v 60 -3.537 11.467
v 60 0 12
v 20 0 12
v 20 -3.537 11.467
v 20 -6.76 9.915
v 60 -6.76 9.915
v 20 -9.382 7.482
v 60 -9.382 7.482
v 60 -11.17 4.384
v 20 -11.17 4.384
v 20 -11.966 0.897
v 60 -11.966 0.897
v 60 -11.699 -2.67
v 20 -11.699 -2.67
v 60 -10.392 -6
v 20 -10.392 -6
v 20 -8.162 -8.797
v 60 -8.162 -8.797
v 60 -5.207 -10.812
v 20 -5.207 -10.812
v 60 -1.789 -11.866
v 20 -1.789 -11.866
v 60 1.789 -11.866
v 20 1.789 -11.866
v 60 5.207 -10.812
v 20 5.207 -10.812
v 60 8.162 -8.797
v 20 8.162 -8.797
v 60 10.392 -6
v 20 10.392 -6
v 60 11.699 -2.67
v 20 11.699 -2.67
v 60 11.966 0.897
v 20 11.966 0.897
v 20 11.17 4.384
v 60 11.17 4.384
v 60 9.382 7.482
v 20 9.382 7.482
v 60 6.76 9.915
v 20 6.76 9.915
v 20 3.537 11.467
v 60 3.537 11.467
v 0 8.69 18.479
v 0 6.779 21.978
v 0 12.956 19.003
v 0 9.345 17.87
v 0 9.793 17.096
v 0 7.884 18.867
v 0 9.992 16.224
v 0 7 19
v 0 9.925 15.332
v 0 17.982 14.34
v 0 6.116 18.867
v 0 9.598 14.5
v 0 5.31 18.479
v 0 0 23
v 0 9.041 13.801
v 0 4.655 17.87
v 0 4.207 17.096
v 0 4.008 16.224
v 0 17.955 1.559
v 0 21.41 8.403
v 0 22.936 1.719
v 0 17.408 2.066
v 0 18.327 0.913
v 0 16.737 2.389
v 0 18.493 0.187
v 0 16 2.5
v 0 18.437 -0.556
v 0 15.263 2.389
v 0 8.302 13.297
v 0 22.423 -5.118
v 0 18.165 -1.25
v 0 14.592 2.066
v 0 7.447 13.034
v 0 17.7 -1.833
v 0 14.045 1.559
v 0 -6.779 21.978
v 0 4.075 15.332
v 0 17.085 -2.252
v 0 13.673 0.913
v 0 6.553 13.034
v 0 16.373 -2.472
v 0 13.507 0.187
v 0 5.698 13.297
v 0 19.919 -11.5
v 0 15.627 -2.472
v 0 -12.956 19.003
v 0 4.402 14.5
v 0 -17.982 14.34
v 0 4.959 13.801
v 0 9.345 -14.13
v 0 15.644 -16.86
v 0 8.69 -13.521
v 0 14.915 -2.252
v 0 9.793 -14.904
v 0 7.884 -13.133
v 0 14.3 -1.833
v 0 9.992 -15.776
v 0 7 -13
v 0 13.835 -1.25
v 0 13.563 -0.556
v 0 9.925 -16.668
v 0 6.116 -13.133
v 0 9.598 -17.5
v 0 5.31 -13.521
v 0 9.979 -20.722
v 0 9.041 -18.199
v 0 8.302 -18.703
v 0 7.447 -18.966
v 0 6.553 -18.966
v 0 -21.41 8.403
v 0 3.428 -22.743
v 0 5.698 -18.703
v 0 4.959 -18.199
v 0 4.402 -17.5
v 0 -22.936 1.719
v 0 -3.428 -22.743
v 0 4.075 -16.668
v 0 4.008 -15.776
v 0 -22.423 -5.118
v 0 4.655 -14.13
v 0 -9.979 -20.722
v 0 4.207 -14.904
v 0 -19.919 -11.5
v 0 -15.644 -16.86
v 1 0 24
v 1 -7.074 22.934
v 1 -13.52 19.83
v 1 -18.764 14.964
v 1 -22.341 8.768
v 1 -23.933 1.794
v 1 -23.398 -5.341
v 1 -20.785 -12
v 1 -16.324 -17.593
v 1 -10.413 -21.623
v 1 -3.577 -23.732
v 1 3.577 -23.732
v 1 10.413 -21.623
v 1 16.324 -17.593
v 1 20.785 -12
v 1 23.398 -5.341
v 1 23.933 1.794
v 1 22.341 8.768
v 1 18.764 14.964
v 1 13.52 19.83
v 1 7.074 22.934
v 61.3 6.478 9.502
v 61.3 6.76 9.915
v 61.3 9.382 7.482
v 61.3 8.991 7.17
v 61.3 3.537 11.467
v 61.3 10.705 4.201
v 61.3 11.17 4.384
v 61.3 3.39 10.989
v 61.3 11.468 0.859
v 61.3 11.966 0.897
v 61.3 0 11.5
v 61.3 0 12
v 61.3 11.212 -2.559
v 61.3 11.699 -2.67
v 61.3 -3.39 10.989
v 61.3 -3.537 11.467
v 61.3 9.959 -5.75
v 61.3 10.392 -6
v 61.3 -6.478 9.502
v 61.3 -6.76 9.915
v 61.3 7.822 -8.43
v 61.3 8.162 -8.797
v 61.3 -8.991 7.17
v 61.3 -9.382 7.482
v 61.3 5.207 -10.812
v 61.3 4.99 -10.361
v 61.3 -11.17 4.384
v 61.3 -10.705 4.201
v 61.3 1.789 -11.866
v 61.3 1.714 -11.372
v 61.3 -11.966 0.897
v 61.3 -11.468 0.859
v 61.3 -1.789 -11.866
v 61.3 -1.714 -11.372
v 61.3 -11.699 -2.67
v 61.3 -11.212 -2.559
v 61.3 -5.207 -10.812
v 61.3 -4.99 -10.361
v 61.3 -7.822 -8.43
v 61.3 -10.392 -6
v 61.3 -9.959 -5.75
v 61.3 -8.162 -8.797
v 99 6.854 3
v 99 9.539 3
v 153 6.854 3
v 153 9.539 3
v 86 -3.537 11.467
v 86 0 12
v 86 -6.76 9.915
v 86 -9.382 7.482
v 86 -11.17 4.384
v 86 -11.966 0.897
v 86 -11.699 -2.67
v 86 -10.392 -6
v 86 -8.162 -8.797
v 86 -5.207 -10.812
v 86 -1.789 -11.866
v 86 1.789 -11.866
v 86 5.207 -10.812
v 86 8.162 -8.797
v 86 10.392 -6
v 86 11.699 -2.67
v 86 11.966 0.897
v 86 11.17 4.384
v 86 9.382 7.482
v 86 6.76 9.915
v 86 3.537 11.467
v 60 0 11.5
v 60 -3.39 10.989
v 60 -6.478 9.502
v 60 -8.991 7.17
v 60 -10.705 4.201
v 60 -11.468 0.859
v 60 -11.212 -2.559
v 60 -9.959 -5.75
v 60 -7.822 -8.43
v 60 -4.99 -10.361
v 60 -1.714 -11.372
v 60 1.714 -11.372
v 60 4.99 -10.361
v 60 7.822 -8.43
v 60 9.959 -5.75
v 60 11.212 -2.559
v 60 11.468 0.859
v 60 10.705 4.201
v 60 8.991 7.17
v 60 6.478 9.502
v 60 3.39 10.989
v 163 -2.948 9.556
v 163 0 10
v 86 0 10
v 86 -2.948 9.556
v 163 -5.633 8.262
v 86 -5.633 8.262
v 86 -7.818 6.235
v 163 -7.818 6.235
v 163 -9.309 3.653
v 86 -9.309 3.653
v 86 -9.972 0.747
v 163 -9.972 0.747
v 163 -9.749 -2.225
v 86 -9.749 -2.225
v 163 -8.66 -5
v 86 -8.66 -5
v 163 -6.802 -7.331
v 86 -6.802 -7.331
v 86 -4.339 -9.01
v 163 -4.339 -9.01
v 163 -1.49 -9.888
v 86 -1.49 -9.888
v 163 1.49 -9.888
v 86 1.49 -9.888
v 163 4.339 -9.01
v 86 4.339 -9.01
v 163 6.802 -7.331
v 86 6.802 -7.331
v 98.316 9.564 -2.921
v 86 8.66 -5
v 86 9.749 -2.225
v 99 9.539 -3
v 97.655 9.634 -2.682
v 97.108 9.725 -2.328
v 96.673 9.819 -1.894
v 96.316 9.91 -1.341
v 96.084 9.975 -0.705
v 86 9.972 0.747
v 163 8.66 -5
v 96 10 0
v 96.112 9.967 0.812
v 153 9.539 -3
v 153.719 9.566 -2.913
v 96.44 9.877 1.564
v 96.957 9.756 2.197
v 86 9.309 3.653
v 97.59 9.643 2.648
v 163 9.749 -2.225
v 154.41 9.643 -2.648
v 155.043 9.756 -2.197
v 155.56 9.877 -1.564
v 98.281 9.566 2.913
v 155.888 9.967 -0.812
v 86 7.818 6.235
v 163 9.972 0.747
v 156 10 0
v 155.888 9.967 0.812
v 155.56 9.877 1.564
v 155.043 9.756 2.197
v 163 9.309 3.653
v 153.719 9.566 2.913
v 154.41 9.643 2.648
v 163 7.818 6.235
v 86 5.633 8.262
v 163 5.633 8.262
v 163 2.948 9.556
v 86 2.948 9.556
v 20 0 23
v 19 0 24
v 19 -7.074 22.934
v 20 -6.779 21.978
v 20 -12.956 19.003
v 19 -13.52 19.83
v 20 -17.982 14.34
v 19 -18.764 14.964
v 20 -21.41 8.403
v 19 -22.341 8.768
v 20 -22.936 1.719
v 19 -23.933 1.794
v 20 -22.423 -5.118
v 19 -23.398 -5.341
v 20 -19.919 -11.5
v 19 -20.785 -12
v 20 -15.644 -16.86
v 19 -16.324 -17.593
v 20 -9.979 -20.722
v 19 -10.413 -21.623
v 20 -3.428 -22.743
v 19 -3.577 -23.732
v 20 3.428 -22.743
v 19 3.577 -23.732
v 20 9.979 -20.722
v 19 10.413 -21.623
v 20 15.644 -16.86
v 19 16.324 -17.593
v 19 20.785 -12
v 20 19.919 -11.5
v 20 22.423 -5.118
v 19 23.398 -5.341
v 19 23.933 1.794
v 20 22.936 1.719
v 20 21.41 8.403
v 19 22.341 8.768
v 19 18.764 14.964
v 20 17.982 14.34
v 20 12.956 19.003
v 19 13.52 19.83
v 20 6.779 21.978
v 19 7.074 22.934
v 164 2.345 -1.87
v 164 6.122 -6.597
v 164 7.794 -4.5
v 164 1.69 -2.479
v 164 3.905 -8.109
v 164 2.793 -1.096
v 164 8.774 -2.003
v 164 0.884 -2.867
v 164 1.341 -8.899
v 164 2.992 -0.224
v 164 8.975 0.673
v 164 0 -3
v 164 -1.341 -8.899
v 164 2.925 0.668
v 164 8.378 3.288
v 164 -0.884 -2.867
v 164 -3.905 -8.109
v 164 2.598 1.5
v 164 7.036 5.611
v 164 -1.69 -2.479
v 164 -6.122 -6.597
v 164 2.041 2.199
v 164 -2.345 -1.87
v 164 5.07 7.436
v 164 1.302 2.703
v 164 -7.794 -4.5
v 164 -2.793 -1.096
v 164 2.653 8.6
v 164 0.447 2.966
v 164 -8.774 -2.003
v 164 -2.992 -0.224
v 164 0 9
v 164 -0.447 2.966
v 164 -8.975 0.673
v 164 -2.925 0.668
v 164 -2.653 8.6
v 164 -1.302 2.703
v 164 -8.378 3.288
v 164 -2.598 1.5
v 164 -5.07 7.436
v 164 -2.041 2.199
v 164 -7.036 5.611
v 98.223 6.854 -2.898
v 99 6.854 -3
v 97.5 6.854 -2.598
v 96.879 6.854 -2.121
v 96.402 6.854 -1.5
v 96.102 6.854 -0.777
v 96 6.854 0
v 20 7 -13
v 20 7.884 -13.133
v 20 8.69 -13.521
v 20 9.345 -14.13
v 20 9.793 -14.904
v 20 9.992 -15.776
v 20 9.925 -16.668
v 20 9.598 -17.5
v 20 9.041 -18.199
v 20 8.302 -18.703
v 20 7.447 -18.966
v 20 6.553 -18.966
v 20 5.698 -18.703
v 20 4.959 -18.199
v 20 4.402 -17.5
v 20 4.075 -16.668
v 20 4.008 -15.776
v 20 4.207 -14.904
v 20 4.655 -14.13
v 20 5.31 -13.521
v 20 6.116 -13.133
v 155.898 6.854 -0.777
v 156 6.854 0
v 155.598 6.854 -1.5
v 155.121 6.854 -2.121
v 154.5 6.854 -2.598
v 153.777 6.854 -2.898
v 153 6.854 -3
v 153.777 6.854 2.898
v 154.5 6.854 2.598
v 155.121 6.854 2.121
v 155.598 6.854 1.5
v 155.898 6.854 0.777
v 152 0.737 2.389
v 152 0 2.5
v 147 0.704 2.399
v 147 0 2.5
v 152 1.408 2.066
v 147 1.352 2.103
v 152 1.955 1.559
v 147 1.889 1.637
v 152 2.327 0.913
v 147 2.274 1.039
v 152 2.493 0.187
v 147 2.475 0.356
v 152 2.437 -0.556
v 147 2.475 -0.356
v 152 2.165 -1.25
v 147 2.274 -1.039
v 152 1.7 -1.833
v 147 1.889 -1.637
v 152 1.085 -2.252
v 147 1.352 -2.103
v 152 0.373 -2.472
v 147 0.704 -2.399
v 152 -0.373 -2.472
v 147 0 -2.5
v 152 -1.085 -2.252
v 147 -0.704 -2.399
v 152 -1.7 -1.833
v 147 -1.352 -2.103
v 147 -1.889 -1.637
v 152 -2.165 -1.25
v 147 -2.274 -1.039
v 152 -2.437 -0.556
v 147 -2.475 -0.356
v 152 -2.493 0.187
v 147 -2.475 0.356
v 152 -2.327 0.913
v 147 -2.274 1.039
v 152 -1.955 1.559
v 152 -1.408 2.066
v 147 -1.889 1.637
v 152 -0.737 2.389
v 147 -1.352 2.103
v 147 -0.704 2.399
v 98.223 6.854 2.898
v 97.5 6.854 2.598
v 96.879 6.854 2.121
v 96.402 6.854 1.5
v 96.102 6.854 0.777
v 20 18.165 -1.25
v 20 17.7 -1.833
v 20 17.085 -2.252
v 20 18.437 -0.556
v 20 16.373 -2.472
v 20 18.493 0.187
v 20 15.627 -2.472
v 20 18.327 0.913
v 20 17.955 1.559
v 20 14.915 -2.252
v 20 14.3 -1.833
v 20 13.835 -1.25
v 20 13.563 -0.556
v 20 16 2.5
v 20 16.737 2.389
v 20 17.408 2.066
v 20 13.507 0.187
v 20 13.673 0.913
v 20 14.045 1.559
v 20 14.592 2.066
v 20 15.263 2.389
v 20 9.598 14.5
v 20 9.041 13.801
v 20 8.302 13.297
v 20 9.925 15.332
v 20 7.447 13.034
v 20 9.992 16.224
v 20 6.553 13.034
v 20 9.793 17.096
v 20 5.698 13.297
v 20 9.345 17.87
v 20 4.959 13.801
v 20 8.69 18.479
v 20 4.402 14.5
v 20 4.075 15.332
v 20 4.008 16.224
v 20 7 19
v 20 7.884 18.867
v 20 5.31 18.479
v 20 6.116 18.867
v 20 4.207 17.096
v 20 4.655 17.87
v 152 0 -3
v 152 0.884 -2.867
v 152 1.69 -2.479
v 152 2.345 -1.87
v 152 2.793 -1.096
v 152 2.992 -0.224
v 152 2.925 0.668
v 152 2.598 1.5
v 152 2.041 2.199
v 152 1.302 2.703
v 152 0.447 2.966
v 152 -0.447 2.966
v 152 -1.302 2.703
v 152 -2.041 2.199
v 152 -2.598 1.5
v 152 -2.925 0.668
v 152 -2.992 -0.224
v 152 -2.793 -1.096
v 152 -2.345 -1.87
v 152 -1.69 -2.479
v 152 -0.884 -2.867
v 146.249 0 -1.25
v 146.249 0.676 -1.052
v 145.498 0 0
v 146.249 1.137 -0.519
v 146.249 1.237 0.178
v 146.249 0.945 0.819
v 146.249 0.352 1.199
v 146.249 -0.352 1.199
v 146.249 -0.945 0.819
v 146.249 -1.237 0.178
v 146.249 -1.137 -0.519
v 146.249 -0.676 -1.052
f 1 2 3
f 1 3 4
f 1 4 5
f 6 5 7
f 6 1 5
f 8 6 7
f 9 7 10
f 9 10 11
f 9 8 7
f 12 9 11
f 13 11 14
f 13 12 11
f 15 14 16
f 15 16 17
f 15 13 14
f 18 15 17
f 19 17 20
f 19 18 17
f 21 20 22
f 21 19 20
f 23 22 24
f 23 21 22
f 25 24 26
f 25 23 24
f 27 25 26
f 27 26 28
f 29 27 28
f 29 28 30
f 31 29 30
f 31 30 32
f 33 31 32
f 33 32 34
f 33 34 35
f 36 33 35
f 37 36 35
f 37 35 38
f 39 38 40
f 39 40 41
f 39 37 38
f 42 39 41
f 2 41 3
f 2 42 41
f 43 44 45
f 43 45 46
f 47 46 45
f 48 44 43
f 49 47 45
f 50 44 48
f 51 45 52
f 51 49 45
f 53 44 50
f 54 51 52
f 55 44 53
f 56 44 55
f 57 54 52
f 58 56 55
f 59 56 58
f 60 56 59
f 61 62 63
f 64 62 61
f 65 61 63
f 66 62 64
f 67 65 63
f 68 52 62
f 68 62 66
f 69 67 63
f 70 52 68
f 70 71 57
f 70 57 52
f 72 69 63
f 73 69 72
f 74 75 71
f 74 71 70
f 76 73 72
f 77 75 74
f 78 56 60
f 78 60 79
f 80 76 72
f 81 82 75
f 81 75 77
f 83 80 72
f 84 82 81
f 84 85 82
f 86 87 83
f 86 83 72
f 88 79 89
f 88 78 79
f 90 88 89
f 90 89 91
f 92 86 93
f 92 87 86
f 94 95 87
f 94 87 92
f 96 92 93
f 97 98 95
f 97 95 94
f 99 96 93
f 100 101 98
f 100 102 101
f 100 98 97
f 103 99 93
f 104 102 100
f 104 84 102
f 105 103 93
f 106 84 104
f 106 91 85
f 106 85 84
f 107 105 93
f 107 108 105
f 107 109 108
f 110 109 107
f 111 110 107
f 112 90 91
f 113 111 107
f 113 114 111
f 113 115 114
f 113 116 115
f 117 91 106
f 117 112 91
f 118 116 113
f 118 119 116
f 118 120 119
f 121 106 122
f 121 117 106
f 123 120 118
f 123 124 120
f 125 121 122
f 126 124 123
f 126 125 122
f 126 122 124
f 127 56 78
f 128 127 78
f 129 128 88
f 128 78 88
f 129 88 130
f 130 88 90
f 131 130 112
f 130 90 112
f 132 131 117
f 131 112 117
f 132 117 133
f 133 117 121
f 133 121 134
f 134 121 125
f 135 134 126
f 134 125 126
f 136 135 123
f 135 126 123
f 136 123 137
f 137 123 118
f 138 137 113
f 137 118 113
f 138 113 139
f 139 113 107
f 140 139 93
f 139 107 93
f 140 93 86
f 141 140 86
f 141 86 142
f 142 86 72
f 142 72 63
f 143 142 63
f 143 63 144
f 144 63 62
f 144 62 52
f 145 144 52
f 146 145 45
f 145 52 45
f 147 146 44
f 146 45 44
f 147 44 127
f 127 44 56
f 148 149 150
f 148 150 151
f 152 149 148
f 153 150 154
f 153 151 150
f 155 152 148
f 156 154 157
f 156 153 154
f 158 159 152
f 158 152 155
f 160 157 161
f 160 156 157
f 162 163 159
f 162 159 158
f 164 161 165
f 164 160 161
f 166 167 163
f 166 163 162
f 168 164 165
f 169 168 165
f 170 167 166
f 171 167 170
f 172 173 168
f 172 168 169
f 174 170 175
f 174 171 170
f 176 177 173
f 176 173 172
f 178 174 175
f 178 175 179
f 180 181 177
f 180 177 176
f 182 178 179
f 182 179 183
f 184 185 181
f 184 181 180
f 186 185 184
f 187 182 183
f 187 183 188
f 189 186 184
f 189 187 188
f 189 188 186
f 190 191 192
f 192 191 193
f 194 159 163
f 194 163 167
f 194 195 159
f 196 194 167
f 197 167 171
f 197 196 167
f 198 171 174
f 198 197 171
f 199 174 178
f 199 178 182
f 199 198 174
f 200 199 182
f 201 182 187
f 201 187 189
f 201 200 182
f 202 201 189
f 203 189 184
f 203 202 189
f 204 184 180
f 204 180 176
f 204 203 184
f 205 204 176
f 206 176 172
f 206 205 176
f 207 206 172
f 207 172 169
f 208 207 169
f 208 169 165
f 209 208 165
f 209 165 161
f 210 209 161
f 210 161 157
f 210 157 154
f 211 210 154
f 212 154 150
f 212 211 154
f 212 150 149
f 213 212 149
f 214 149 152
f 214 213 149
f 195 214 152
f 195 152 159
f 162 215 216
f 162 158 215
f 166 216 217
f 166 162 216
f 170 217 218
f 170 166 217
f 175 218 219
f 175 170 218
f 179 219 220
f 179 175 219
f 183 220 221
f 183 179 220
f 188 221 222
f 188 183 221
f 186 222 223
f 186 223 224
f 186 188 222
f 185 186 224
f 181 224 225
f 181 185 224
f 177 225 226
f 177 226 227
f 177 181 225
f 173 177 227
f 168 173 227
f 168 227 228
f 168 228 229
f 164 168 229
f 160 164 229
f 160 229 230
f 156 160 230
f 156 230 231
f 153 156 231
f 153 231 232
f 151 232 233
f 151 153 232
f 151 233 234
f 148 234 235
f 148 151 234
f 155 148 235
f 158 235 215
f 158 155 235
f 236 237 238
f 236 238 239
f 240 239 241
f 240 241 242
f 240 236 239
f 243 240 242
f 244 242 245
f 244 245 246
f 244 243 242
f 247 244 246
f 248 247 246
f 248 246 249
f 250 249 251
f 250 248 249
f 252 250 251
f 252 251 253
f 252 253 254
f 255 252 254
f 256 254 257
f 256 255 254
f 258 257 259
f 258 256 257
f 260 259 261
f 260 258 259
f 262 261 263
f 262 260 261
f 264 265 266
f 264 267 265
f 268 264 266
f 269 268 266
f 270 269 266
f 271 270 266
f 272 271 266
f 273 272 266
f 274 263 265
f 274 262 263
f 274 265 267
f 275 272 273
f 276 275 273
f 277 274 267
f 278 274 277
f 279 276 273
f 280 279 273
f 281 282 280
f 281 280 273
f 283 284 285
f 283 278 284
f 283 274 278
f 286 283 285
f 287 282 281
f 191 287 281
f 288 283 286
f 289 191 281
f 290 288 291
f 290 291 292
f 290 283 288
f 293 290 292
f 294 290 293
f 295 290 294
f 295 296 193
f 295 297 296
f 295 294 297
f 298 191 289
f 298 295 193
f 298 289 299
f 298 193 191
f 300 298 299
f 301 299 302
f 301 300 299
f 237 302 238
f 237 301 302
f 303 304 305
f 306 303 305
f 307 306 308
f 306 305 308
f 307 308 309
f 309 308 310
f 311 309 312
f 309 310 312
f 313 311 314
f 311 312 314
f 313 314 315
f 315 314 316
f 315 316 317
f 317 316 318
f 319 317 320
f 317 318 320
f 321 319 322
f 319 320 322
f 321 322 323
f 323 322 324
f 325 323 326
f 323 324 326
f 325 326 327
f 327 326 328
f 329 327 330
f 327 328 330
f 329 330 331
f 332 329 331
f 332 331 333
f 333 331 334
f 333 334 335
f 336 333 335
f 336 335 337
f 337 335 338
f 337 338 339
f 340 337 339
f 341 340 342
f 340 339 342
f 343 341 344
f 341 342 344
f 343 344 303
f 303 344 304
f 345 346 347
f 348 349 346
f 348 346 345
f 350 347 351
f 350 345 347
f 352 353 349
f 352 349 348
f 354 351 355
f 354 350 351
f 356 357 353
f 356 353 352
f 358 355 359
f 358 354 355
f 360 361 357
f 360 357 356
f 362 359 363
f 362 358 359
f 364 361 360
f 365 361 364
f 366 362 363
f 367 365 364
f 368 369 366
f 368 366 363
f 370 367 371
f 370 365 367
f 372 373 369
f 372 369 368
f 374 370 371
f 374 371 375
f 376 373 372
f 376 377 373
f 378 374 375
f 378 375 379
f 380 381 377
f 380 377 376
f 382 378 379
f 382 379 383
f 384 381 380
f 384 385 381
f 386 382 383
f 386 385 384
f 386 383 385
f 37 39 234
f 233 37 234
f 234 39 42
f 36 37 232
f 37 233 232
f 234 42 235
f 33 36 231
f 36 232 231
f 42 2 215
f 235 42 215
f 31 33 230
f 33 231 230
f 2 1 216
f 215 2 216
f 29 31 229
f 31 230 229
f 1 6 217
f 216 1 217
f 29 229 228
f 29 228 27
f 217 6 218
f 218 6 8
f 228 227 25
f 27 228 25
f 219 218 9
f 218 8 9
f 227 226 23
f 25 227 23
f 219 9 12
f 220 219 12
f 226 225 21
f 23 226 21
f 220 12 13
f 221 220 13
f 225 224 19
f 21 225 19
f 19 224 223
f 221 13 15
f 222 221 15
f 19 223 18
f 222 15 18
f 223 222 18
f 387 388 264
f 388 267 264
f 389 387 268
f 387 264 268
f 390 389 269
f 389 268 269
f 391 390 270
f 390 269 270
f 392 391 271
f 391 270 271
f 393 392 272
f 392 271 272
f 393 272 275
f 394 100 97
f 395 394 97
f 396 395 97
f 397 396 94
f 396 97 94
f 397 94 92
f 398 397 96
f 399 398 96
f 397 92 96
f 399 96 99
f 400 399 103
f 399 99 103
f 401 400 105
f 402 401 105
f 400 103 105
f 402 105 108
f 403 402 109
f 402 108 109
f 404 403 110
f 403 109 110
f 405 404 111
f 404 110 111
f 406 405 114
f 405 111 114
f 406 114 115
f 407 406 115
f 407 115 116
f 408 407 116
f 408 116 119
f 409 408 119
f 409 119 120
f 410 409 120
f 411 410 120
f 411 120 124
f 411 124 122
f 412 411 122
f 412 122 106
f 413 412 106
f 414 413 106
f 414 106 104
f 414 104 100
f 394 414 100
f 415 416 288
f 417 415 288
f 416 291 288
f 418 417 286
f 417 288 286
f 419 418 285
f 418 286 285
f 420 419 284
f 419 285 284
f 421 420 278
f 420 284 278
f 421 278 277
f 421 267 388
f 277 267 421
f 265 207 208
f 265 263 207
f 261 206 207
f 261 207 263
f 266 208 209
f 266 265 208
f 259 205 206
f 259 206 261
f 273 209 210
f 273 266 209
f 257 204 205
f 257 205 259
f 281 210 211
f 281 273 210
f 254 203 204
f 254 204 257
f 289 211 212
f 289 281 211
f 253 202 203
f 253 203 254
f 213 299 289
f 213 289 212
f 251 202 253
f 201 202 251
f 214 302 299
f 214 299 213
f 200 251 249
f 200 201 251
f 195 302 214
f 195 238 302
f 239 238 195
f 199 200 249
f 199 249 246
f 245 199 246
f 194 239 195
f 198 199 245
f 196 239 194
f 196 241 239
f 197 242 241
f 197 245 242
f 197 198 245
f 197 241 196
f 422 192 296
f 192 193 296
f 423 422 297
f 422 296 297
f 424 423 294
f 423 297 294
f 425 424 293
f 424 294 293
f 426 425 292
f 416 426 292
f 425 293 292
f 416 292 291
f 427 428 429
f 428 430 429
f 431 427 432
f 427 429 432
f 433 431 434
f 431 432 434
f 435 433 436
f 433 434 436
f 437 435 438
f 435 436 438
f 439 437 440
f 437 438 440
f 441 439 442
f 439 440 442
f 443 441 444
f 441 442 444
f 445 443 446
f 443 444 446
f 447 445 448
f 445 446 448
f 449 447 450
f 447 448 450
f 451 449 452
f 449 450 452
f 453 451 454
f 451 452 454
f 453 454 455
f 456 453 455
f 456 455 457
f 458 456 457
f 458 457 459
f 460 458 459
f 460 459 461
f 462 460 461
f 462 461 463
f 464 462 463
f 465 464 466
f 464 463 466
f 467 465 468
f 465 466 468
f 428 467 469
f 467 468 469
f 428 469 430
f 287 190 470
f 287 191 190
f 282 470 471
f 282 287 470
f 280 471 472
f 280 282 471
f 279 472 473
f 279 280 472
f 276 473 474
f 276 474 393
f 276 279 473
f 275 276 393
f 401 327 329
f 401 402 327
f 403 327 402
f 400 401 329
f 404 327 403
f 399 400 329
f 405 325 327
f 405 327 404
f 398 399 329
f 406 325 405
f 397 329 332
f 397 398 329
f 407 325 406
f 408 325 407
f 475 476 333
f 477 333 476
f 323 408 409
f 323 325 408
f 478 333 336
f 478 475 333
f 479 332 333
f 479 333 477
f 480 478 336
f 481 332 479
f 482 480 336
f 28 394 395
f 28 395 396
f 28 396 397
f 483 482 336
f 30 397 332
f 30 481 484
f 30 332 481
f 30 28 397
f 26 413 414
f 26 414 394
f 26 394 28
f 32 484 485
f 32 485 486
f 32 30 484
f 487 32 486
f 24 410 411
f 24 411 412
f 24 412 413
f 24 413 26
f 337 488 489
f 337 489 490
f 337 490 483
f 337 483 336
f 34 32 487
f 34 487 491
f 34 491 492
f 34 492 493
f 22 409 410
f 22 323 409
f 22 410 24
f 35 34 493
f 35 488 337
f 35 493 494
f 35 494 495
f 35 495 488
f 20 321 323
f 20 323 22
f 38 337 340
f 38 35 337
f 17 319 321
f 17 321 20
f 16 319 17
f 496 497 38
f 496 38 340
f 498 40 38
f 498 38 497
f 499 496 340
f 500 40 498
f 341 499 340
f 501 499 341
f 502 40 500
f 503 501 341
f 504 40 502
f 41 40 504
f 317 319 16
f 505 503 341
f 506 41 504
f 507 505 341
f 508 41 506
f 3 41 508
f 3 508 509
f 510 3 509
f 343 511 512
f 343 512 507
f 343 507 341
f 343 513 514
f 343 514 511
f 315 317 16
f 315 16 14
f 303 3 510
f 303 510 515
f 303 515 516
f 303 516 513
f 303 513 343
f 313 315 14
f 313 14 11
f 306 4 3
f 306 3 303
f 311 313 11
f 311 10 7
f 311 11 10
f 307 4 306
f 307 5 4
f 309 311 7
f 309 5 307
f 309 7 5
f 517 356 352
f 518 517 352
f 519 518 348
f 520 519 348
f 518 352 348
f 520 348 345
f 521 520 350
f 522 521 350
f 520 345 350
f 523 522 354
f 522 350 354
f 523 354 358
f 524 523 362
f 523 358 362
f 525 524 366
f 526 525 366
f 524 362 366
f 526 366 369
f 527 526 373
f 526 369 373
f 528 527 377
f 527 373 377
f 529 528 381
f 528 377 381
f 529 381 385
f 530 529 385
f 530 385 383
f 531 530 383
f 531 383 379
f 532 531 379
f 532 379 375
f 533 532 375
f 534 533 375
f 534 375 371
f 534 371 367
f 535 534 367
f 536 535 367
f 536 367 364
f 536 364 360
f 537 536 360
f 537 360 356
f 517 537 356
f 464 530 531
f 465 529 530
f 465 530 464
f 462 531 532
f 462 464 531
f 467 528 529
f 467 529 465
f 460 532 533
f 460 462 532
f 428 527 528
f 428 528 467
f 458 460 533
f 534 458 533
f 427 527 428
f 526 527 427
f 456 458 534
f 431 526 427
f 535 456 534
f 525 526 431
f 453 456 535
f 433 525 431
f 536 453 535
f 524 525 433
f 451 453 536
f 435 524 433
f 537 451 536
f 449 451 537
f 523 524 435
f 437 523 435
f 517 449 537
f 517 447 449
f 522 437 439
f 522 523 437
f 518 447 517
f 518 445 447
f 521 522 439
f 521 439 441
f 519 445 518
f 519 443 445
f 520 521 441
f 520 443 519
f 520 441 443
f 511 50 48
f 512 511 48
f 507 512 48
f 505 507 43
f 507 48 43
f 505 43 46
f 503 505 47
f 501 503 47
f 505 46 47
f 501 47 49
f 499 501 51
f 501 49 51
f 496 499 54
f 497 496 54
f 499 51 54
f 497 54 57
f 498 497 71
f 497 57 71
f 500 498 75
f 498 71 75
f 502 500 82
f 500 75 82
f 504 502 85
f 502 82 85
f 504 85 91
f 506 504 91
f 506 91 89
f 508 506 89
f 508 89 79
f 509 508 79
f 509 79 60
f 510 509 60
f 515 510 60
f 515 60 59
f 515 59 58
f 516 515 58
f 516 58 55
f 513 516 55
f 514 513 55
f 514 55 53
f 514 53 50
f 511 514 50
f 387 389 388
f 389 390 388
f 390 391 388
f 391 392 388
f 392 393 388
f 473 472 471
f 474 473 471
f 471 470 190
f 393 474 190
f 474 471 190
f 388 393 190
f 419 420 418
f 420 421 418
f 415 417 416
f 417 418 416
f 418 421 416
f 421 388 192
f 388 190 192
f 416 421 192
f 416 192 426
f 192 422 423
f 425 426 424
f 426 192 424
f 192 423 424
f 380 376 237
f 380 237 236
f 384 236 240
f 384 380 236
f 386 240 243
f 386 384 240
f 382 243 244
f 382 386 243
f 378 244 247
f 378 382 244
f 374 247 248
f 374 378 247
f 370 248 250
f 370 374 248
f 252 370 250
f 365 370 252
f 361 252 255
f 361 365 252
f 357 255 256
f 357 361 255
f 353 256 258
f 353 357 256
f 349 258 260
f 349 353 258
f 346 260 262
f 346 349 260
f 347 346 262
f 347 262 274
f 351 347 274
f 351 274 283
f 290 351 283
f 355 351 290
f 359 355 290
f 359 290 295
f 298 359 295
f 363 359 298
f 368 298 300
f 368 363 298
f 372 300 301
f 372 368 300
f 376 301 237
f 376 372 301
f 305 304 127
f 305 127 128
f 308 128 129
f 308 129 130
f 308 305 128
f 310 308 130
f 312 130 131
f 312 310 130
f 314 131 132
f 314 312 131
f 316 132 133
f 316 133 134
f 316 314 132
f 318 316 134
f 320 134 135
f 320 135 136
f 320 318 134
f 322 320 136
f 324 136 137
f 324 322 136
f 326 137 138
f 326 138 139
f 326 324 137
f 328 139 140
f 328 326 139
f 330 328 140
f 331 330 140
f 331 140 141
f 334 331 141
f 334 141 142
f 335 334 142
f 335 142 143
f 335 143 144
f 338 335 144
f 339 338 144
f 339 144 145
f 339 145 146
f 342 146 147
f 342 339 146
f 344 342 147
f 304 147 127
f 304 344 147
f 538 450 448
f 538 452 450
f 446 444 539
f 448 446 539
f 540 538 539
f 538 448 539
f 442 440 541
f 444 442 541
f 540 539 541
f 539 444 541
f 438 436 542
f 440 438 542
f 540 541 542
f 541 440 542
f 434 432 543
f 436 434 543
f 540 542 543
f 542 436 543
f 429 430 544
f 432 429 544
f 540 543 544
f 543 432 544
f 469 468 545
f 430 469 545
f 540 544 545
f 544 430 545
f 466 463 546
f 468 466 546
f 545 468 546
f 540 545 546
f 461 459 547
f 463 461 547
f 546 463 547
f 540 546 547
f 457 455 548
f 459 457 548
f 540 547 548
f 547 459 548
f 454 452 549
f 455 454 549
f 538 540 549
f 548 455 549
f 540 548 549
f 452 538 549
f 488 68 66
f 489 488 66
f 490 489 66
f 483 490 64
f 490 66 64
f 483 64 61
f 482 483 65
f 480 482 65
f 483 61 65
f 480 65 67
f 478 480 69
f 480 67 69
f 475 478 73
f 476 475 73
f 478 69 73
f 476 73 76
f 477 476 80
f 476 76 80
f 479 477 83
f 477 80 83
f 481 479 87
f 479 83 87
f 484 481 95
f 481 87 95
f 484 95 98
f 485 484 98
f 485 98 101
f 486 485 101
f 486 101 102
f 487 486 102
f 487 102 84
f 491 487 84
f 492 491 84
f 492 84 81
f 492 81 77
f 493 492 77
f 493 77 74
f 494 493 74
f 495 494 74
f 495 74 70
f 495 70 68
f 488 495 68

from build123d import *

# Parameters (mm, degrees)
PER_AGE1_D              = 5
PER_AGE1_DEPTH          = 17
PER_AGE1_CBORE_D        = 6
PER_AGE1_CBORE_DEPTH    = 12
PER_AGE1_TIP            = 1.502151548
ESQUISSE6_W             = 1.3
ESQUISSE6_H             = 0.5
ESQUISSE5_W             = 60
ESQUISSE5_H             = 3.145636389
ENL_V_MAT_EXTRU_1_DEPTH = 3
CONG_1_R                = 3
CHANFREIN1_SIZE         = 1
ESQUISSE7_R             = 3
ESQUISSE7_R_2           = 2.5
ENL_V_MAT_EXTRU_2_DEPTH = 168.475371324


with BuildPart() as part:
    # Esquisse1 → Base-Révolution (revolve)
    with BuildSketch(Plane.XY, mode=Mode.PRIVATE) as base_r_volution_sk:
        Polygon((0, 0), (0, 24), (20, 24), (20, 12), (86, 12), (86, 10), (164, 10), (164, 0), align=None)
    revolve(base_r_volution_sk.sketch.rotate(Axis((0, 0, 0), (1, 0, 0)), 90), axis=Axis((0, 0, 0), (1, 0, 0)))

    # Perçage1
    with Locations(Plane(origin=(164, 0, 0), x_dir=(0, 0, -1), z_dir=(1, 0, 0))):
        with Locations((0, 0)):
            CounterBoreHole(PER_AGE1_D / 2, PER_AGE1_CBORE_D / 2, PER_AGE1_CBORE_DEPTH, depth=PER_AGE1_DEPTH)
            with Locations((0, 0, -(PER_AGE1_DEPTH + PER_AGE1_TIP / 2))):  # 118° drill point
                Cone(0, PER_AGE1_D / 2, PER_AGE1_TIP, mode=Mode.SUBTRACT)

    # Esquisse6 → Enlèvement de matière-Révolution1 (revolve, cut)
    with BuildSketch(Plane.XY, mode=Mode.PRIVATE) as enl_vement_de_mati_re_r_volution1_sk:
        with Locations((60.65, 11.75)):
            Rectangle(ESQUISSE6_W, ESQUISSE6_H)
    revolve(enl_vement_de_mati_re_r_volution1_sk.sketch.rotate(Axis((0, 0, 0), (1, 0, 0)), 90), axis=Axis((0, 0, 0), (1, 0, 0)), mode=Mode.SUBTRACT)

    # Esquisse5 → Enlèv. mat.-Extru.1 (cut, symmetric)
    with BuildSketch(Plane.XY):
        with Locations((126, 8.427181806)):
            Rectangle(ESQUISSE5_W, ESQUISSE5_H)
    extrude(amount=ENL_V_MAT_EXTRU_1_DEPTH, both=True, mode=Mode.SUBTRACT)

    # Congé1
    cong_1_edges = [part.edges().sort_by_distance(p)[0] for p in [
        (96, 8.196877813, 3),
        (156, 8.196877813, 3),
        (156, 8.196877813, -3),
        (96, 8.196877813, -3),
    ]]
    fillet(cong_1_edges, radius=CONG_1_R - 0.0001)  # a hair under: the kernel refuses the full size

    # Chanfrein1
    chanfrein1_edges = [part.edges().sort_by_distance(p)[0] for p in [
        (164, 0, -10),
        (20, 0, -24),
        (0, 0, -24),
    ]]
    chamfer(chanfrein1_edges, length=CHANFREIN1_SIZE)

    # Esquisse7 → Enlèv. mat.-Extru.2 (cut, through all)
    with BuildSketch(Plane.ZY):
        with Locations((-16, 7)):
            Circle(ESQUISSE7_R)
        with Locations((16, 7)):
            Circle(ESQUISSE7_R)
        with Locations((0, 16)):
            Circle(ESQUISSE7_R_2)
    extrude(amount=-ENL_V_MAT_EXTRU_2_DEPTH, mode=Mode.SUBTRACT)


solid = part.part
